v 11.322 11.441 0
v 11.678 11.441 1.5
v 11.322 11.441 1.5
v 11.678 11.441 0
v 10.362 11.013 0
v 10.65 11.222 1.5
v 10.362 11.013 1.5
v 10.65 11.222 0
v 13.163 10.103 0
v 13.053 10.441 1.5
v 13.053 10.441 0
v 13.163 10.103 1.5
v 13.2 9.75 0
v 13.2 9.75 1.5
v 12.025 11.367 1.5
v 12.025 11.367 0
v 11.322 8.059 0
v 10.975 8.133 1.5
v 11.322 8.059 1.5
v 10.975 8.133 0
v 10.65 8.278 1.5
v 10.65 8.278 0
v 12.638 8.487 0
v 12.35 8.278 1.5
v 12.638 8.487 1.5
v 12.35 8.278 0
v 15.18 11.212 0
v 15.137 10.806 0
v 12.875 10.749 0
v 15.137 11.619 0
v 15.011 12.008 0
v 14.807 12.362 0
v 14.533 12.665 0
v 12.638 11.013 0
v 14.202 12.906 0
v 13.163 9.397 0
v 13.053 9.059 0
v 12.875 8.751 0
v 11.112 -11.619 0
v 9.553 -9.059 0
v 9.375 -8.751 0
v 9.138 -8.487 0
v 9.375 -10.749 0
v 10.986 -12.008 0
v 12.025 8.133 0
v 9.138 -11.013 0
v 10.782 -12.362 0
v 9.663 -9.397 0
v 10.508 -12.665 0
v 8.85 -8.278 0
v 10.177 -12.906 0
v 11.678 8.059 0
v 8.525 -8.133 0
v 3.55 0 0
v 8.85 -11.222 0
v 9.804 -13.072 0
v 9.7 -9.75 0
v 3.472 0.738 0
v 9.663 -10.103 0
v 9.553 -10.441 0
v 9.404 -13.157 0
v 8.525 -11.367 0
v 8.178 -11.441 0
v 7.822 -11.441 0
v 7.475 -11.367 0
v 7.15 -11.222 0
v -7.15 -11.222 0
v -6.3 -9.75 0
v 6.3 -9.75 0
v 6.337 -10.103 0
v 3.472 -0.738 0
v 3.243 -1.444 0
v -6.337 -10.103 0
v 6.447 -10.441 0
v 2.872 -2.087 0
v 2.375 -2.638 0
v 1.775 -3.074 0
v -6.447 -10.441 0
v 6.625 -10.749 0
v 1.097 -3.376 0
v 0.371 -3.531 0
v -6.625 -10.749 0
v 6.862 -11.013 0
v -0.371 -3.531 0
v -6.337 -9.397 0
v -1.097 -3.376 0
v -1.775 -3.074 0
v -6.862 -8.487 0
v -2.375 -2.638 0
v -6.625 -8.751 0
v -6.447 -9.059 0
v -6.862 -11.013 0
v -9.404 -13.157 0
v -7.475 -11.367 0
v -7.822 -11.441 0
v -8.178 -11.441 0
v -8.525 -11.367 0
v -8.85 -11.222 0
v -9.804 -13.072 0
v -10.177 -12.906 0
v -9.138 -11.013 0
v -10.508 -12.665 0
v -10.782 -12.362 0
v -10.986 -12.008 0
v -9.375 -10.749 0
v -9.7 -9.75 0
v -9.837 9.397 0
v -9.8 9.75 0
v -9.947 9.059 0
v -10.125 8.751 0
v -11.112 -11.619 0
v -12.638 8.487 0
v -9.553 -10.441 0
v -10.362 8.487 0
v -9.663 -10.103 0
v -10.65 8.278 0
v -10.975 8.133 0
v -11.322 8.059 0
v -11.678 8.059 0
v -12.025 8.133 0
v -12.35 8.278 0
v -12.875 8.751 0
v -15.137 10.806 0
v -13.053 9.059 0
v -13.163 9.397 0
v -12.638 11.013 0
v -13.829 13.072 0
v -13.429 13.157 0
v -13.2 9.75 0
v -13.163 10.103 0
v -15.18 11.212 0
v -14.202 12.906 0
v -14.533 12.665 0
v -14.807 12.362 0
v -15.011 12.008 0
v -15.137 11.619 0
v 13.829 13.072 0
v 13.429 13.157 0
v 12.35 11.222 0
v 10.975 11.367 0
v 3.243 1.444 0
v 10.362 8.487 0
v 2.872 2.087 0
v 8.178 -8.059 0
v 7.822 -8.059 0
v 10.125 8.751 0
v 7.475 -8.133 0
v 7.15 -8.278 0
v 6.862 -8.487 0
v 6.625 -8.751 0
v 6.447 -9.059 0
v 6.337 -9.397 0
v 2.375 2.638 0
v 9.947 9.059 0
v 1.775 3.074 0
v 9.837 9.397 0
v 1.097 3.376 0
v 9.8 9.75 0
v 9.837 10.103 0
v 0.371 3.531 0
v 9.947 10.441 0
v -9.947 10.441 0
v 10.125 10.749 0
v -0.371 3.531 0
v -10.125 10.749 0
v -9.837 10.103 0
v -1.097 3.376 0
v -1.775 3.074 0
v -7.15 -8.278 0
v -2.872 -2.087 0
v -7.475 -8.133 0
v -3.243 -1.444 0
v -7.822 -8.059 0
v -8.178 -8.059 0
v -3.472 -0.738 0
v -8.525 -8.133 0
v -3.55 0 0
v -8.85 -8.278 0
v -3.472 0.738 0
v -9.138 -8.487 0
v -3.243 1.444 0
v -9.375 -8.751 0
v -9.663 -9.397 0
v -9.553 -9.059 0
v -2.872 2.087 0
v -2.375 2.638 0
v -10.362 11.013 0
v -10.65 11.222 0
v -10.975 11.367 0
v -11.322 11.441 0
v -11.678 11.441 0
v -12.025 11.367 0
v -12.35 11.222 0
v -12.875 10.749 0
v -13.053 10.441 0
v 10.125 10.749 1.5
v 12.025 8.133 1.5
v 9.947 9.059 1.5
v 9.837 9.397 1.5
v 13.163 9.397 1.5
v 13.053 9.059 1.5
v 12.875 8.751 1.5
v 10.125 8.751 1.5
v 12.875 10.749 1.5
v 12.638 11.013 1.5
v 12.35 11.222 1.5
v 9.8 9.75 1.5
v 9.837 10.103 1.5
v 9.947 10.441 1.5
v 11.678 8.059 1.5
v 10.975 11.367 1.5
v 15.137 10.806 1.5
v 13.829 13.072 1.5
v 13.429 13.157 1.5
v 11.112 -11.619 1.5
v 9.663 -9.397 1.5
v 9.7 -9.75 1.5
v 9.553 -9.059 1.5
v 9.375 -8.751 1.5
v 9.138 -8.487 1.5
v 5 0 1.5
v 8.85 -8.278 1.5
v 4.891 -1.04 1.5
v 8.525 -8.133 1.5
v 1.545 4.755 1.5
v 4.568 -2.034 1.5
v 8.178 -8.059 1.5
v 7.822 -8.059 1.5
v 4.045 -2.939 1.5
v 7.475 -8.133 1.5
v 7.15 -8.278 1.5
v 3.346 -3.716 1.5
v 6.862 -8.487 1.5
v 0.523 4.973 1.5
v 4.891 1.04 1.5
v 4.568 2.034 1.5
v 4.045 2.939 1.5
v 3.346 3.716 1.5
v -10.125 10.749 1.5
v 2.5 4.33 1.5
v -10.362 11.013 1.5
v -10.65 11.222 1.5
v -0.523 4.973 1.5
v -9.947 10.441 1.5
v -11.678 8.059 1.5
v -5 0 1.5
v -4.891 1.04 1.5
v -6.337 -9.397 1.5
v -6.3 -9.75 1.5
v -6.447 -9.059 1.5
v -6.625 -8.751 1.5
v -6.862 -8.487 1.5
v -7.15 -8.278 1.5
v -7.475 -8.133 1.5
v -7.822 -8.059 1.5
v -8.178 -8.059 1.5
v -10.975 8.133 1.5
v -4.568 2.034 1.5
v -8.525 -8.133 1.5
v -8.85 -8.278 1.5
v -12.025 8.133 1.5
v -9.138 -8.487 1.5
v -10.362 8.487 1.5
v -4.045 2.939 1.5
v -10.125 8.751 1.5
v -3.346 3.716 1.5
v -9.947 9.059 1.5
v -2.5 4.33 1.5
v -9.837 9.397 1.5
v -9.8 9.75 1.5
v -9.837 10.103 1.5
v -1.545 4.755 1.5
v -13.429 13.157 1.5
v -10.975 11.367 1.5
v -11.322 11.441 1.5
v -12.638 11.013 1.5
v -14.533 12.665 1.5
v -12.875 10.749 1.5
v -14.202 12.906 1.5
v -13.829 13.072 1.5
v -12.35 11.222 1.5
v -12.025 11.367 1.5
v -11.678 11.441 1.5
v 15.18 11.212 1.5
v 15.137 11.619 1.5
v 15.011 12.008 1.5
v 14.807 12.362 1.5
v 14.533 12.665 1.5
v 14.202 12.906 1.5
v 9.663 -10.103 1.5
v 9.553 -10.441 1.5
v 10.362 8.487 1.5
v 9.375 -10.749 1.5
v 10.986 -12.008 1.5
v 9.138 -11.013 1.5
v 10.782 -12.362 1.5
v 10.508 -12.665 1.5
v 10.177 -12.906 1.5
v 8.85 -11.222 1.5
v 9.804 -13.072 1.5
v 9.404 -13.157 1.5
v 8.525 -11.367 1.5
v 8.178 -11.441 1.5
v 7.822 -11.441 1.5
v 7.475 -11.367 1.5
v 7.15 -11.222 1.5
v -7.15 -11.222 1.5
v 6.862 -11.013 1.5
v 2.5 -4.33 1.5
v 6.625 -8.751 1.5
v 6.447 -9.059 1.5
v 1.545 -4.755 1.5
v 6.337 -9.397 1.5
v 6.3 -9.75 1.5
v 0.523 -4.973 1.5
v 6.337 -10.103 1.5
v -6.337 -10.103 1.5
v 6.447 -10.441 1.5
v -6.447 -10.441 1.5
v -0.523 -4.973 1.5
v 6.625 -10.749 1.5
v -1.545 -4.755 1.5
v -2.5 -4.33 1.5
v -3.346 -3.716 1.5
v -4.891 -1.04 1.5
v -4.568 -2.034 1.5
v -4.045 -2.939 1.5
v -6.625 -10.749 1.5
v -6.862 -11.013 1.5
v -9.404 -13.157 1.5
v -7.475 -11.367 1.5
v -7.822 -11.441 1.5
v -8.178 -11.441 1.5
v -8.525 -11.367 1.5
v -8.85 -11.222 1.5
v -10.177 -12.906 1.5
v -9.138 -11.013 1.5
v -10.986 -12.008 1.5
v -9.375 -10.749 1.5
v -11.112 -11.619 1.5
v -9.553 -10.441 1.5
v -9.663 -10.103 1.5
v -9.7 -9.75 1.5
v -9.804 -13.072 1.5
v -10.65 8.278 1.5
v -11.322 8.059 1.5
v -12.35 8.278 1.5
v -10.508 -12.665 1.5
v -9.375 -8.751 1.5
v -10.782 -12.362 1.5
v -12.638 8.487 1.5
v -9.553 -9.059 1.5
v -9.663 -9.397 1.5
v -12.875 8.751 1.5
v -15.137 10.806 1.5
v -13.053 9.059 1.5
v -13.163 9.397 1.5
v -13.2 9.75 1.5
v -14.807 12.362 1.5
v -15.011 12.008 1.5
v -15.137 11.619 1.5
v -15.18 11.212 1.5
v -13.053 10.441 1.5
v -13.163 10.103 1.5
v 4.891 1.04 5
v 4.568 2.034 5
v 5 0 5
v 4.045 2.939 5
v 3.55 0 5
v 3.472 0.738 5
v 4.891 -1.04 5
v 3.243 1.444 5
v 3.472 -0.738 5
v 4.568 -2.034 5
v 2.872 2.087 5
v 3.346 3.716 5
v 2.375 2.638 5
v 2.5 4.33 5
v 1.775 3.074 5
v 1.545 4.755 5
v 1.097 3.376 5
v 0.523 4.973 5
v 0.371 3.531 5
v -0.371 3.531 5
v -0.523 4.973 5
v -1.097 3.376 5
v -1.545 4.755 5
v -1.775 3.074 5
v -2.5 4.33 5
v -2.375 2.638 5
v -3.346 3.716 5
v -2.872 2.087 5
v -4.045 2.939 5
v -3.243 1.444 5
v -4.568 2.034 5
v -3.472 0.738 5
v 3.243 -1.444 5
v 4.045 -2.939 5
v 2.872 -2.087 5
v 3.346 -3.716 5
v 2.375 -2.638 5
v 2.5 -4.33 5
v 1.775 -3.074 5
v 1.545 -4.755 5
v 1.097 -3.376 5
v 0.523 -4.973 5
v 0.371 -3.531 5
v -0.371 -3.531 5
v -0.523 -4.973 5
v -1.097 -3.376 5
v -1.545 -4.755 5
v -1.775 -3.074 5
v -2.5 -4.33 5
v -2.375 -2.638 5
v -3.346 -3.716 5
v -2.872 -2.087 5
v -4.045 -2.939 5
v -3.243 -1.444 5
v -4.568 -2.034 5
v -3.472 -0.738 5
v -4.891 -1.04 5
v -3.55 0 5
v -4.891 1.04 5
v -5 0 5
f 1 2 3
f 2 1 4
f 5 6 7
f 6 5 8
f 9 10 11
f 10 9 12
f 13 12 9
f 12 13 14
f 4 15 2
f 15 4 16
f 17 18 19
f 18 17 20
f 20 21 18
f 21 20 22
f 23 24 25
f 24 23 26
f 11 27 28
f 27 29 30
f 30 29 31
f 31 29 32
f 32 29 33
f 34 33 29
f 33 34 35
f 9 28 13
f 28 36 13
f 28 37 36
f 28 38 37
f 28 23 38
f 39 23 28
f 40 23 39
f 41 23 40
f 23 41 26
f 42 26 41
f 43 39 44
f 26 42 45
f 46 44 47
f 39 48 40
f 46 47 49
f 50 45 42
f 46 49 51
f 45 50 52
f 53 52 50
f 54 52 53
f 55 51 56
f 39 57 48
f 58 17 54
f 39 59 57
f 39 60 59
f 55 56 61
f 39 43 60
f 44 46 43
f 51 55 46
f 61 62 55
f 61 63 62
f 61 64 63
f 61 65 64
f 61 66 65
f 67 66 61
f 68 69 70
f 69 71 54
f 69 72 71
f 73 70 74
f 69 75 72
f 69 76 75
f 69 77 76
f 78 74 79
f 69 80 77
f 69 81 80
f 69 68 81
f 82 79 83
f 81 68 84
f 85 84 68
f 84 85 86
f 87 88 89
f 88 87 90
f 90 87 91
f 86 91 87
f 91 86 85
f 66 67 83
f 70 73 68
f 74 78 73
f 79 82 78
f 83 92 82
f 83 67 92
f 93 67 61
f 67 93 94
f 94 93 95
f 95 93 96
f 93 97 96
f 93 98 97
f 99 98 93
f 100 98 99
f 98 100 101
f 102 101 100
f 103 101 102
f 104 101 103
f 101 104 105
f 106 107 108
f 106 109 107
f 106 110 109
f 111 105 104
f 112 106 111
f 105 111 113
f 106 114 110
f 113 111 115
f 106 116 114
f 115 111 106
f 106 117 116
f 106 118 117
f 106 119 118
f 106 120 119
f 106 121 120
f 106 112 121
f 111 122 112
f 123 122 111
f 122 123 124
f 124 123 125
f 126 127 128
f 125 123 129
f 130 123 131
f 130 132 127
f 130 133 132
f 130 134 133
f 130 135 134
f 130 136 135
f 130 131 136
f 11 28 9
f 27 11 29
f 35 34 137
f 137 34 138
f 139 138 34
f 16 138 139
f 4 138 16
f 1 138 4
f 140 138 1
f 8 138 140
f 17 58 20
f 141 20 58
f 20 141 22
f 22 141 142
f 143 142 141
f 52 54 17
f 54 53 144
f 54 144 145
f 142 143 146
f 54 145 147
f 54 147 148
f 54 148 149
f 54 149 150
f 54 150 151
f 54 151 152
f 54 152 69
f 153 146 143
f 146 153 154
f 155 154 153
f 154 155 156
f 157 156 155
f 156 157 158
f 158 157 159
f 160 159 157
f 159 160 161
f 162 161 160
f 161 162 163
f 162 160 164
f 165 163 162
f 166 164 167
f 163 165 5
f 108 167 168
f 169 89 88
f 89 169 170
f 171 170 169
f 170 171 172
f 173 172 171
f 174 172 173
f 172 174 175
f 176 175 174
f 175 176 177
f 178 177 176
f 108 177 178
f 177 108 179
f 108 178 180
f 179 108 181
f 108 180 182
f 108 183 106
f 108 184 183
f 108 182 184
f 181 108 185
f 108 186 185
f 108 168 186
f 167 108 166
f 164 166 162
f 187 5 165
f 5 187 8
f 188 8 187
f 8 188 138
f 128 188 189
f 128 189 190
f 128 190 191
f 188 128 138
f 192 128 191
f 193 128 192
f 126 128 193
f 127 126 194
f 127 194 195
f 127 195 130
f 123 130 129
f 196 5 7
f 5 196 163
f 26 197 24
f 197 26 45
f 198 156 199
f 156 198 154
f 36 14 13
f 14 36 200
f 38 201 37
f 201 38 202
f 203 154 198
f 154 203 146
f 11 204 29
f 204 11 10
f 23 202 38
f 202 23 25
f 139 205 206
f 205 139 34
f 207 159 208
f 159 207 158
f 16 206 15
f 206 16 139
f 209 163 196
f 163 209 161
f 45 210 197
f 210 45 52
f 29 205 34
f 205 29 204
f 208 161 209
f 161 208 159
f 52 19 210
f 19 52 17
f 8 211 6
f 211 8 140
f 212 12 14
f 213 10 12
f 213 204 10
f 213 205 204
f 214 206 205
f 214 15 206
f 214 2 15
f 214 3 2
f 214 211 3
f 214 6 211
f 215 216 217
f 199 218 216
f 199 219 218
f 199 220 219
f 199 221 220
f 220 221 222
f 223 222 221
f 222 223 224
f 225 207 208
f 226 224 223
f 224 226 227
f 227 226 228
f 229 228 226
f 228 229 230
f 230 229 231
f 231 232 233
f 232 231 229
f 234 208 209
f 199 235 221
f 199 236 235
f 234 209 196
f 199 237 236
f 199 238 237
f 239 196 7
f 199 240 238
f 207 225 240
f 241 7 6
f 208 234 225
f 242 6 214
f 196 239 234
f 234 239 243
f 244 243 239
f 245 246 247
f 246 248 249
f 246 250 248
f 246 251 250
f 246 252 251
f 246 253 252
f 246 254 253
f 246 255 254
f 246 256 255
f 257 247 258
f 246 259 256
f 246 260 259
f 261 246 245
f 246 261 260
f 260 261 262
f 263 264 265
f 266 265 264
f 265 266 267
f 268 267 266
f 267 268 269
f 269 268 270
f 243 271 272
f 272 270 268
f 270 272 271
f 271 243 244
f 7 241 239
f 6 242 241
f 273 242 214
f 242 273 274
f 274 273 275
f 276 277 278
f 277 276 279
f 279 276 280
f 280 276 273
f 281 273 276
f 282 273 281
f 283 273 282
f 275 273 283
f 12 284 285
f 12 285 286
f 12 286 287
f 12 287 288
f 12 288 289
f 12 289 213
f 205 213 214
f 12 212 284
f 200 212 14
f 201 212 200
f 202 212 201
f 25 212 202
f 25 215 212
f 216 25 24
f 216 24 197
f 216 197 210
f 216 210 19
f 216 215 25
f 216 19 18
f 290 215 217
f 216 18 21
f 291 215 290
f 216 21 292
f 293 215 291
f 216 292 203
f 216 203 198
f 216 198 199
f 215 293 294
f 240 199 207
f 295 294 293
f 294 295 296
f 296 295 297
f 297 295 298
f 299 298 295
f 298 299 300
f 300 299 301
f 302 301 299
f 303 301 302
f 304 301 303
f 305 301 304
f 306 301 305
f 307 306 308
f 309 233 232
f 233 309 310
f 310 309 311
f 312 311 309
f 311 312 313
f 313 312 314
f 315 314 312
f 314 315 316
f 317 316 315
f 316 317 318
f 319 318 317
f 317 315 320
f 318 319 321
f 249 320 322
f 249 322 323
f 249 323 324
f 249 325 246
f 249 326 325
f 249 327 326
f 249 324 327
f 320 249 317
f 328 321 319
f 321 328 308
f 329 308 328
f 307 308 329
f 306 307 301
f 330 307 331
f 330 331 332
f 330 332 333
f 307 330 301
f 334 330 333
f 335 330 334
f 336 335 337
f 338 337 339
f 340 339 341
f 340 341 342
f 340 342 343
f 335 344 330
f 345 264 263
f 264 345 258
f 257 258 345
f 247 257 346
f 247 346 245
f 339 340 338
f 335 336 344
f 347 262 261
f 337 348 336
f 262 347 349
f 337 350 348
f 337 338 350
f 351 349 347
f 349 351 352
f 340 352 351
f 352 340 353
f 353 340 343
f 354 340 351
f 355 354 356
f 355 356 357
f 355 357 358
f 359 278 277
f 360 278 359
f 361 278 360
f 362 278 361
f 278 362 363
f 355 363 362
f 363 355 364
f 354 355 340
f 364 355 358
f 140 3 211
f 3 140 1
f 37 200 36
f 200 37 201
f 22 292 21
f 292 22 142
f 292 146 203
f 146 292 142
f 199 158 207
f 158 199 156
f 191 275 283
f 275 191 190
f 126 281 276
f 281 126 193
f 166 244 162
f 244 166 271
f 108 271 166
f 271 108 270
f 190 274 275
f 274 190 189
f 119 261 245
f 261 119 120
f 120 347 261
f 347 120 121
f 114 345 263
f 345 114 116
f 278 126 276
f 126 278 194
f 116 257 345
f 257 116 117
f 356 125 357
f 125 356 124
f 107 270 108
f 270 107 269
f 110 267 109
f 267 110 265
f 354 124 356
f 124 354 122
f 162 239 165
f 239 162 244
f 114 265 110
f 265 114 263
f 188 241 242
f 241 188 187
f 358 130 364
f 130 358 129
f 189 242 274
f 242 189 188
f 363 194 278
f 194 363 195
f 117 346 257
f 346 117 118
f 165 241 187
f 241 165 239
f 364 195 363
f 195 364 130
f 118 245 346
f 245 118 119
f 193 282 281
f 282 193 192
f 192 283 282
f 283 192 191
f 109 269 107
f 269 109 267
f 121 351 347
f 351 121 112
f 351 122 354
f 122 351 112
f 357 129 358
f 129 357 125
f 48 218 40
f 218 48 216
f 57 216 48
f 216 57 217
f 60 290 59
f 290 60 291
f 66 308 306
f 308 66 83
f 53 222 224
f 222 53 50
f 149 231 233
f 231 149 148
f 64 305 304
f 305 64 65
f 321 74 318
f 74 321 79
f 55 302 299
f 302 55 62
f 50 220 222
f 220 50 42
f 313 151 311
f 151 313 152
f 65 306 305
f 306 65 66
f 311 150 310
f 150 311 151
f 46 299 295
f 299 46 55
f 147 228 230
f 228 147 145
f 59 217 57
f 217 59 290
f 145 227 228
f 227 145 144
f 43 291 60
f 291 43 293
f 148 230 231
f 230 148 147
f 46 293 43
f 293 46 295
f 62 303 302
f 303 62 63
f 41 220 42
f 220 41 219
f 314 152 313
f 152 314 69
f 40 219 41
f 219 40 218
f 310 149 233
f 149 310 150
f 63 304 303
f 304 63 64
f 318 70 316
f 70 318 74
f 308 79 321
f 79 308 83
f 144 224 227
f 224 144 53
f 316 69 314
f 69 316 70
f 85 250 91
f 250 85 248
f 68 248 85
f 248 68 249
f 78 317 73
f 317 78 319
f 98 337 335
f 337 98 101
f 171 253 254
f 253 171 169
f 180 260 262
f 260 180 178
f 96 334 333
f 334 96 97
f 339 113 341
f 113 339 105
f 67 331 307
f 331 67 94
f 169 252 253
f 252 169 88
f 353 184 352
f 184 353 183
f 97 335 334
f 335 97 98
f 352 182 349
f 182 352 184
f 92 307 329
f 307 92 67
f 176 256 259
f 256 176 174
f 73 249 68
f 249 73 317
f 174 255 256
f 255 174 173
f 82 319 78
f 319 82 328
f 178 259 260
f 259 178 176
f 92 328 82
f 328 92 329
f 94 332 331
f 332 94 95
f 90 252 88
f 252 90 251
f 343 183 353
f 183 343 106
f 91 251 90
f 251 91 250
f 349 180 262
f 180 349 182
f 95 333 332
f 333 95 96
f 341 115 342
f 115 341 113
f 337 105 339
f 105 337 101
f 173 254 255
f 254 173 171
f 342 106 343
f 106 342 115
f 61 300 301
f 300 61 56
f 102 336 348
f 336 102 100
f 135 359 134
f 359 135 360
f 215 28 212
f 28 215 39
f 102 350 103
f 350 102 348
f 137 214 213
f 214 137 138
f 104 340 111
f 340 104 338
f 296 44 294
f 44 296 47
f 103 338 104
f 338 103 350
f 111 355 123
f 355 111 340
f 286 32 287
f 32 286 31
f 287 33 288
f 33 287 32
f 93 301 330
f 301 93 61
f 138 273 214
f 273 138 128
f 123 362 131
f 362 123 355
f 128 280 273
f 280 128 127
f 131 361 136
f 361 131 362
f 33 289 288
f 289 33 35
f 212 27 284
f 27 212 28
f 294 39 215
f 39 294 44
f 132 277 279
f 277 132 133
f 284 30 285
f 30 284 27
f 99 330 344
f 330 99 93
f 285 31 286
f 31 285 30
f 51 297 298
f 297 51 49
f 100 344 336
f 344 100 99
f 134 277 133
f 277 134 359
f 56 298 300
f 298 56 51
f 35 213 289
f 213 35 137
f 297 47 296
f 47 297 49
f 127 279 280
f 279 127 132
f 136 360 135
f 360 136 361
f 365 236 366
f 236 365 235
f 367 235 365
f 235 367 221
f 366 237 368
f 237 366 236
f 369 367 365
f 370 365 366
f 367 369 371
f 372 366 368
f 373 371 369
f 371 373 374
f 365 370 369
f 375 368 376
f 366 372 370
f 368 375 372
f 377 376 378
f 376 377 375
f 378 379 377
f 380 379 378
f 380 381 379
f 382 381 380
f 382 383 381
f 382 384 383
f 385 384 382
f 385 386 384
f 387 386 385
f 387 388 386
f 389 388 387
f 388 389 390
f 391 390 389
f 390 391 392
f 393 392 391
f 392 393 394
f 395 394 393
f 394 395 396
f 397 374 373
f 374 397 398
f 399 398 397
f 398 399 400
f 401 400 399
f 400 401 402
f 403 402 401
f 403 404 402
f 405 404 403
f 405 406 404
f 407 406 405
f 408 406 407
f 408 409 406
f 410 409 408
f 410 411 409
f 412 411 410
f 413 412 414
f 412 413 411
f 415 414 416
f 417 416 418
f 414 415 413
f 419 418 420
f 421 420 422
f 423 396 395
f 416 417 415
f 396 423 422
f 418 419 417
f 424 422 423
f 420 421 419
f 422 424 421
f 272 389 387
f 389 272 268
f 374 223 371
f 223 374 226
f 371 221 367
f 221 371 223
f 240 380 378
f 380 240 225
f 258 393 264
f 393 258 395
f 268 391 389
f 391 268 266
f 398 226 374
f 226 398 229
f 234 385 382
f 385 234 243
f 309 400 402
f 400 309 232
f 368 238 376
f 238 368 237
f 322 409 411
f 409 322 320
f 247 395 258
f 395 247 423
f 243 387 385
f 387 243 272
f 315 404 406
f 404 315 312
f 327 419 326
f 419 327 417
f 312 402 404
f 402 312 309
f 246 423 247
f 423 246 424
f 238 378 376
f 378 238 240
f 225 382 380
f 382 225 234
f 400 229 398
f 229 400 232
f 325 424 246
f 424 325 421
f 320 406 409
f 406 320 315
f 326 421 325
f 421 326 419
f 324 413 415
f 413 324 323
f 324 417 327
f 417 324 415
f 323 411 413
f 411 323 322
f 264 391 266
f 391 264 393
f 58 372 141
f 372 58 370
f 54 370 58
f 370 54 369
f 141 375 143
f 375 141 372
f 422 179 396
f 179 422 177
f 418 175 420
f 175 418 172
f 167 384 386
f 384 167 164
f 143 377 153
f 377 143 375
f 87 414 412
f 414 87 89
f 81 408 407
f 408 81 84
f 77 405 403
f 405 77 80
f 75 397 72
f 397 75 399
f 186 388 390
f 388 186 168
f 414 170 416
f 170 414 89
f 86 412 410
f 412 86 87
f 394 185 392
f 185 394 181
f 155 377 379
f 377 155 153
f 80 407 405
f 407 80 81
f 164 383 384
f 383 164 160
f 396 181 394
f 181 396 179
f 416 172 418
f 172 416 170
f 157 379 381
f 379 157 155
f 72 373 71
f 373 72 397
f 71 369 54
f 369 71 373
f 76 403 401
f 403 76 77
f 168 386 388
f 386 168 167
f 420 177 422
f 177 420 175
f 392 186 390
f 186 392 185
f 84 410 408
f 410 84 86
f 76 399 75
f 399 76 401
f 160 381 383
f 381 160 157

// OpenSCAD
// file: dronePlates.scad
/**
 * dronePlates.scad
 * Plate library
 *
 * GNU GPL V3
 * @author: Victor Potenciano
 */

m3Rad = 3.4/2;
cornerR = 4;

/**
 *
 */
module helperDisk(diameter) {
	cylinder(r = diameter/2, h = 0.6, $fn=20);
}

/**
 *
 */
module roundedRect(size, radius) {
	x = size[0];
	y = size[1];
	z = size[2];

	linear_extrude(height=z)
	hull() {
	// place 4 circles in the corners, with the given radius
	translate([(-x/2)+(radius/2), (-y/2)+(radius/2), 0]){ circle(r=radius); }
	translate([(x/2)-(radius/2), (-y/2)+(radius/2), 0]){ circle(r=radius); }
	translate([(-x/2)+(radius/2), (y/2)-(radius/2), 0]){ circle(r=radius); }
	translate([(x/2)-(radius/2), (y/2)-(radius/2), 0]){ circle(r=radius); }
	}
}

/**
 * rounded rectangle triangle with corner at origin
 */
module roundedTriangle(size, radius) {
	x = size[0];
	y = size[1];
	z = size[2];

	linear_extrude(height=z)
	hull() {
	translate([radius, radius, 0]){ circle(r=radius); }
	translate([x-radius, radius, 0]){ circle(r=radius); }
	translate([radius, y-radius, 0]){ circle(r=radius); }
	}
}

/**
 *
 */
module roundRectPlate(w, l, plateThick=3) {
	difference(){
		roundedRect([l+m3Rad*1.75,w+m3Rad*1.75,plateThick], cornerR);
		translate([l/2, w/2, -0.5]) { cylinder(h = plateThick+1, r = m3Rad, $fn=30); }
		translate([-l/2, w/2, -0.5]) { cylinder(h = plateThick+1, r = m3Rad, $fn=30); }
		translate([l/2, -w/2, -0.5]) { cylinder(h = plateThick+1, r = m3Rad, $fn=30); }
		translate([-l/2, -w/2, -0.5]) { cylinder(h = plateThick+1, r = m3Rad, $fn=30); }
	}
}

/**
 *
 */
module crossSquarePlate(l, thick=3) {
	inDist = cornerR*2+4;
	trianL = sqrt((l*l)/2)-inDist;
	centerR = 4;

	difference(){
		roundRectPlate(l, l, thick);
		translate([0, centerR, -0.5]) { 
			rotate([0,0,45]){ roundedTriangle([trianL,trianL,thick+1], cornerR-2); }
		}
		translate([0, -centerR, -0.5]) { 
			rotate([0,0,225]){ roundedTriangle([trianL,trianL,thick+1], cornerR-2); }
		}
		translate([-centerR, 0, -0.5]) { 
			rotate([0,0,135]){ roundedTriangle([trianL,trianL,thick+1], cornerR-2); }
		}
		translate([centerR, 0, -0.5]) { 
			rotate([0,0,-45]){ roundedTriangle([trianL,trianL,thick+1], cornerR-2); }
		}
	}
}

/**
 *
 */
module hShapePlate(w, l, thick=4) {
	inDist = cornerR*2+1;

	difference(){
		roundRectPlate(w, l, thick);
		translate([0, w/4, -0.5]) { roundedRect([l-inDist,w/2-inDist,thick+1], cornerR-2); }
		translate([0, -w/4, -0.5]) { roundedRect([l-inDist,w/2-inDist,thick+1], cornerR-2); }
	}
}

/**
 *
 */
module motorCircleMount(inDia, outDia, thick=3, extraH=false, d1=19, d2=16, holeR=m3Rad ) {
	difference(){
		cylinder(h = thick, r = outDia/2, $fn=30);
		motorCircleMountHoles(inDia, outDia, thick, extraH, d1=d1, d2=d2, holeR=holeR);
	}
}

/**
 *
 */
module motorCircleMountHoles(inDia, outDia, thick=3, extraH=false, d1=19, d2=16, d3=25, holeR=m3Rad) {
	translate([0, 0, -0.5]) { cylinder(h = thick+1, r = inDia/2, $fn=30); }

	for(i=[0:3]) {
		rotate([0,0,90*i]){
		translate([d1/2, 0, -0.5]) cylinder(h = thick+1, r = holeR, $fn=20);
		translate([d2/2, 0, -0.5]) cylinder(h = thick+1, r = holeR, $fn=20);
		translate([d2/2, -holeR, -0.5]) cube(size = [(d1-d2)/2,holeR*2,thick+1]);
		}
	}
	
	if(extraH==true){	
		for(i=[-1,1]) translate([i*d3/2, 0, -0.5]) { cylinder(h = thick+1, r = holeR, $fn=30); }
	}
}

/**
 *
 */
module motorRectMount(w, l, inDia, thick=3) {
	d1=19;
	d2=16;

	difference(){
		roundRectPlate(w, l, thick);
		translate([0, 0, -0.5]) { cylinder(h = thick+1, r = inDia/2, $fn=30); }
		translate([0, d1/2, -0.5]) { cylinder(h = thick+1, r = m3Rad, $fn=30); }
		translate([0, -d1/2, -0.5]) { cylinder(h = thick+1, r = m3Rad, $fn=30); }
		translate([d2/2, 0, -0.5]) { cylinder(h = thick+1, r = m3Rad, $fn=30); }
		translate([-d2/2, 0, -0.5]) { cylinder(h = thick+1, r = m3Rad, $fn=30); }
	}
}

/**
 *
 */
module tube(inDia, outDia, height) {
	difference(){
		cylinder(h = height, r = outDia/2, $fn=50);
		translate([0, 0, -0.5]) { cylinder(h = height+1, r = inDia/2, $fn=30); }
	}
}

/**
 *
 */
module squareTube(inDia, outDia, height) {
	translate([0,0,height/2]){
	difference(){
		cube(size = [outDia,outDia,height], center = true);
		cube(size = [inDia,inDia,height+1], center = true);
	}
	}
}

/**
 *
 */
module djiFlamewheelHoles(height) {
	a = 23;
	b = 16;
	c = 19.5;
	
	translate([a/2, c/2, 0]) { cylinder(h = height, r = m3Rad, $fn=30); }
	translate([-a/2, c/2, 0]) { cylinder(h = height, r = m3Rad, $fn=30); }
	translate([b/2, -c/2, 0]) { cylinder(h = height, r = m3Rad, $fn=30); }
	translate([-b/2, -c/2, 0]) { cylinder(h = height, r = m3Rad, $fn=30); }
}

/**
 *
 */
module djiFlamewheelHolesBotton(height) {
	a1 = 21;
	c = 19.5;
	
	translate([a1/2, c/2, 0]) { cylinder(h = height, r = m3Rad, $fn=30); }
	translate([-a1/2, c/2, 0]) { cylinder(h = height, r = m3Rad, $fn=30); }
}

/**
 *
 */
module propeller(size){
union(){
difference(){
	cylinder(h = 3, r = size/2, center=true, $fn=30);
	cylinder(h = 3.1, r = size/2-2, center=true, $fn=30); 
}
for( i = [-1,1] ){
rotate([0,0,45*i]){ cube(size = [size,4,1], center = true); }
}
}
}

/**
 *
 */
module slot(length, height, rad){
for(i=[-1,1]) translate([i*length/2,0,0]) cylinder(h = height, r = rad, $fn=30);
translate([0,0,height/2]) cube(size = [length,rad*2,height], center = true);
}

 

////////////////////////
// Examples:
////////////////////////

motorCircleMount(8, 25, 3.5);

//roundedRect([50,50,3], 4);

//hShapePlate(79, 25);

//rotate([0,0,45]){roundedTriangle([40,40,3], 4);}

//crossSquarePlate(45, 4);

/*
union(){
motorRectMount(21, 18, 8, 4);
translate([9, 10.5, 0]) {tube(m3Rad*2, 6.5, 6);}
}
*/

/*
difference(){
union(){
hShapePlate(50, 30, 3.5);
translate([-4,-25,0]){cube(size = [8,50,3.5]);}
rotate([0, 0, 45]) {motorCircleMount(8, 35, 3.5);}
}
cylinder(h = 10, r = 4, $fn=100, center=true);
}
*/

//rotate([90,0,0]){ tube(5,10,20); }
//translate([20,0,0]){ squareTube(5, 10, 20); }
// main file
/**
 * sma antenna extension mount inside f450 arms hub hole
 */

use <dronePlates.scad>;

m3Rad = 3.4/2;
plateThick = 1.5;

difference(){
union(){
hull(){
scale([1.15,1.15,1]) djiFlamewheelHoles(plateThick);
}

cylinder(r=10/2, h=5, $fn=30);

}//union

djiFlamewheelHoles(plateThick);
cylinder(r=7.1/2, h=10, center=true, $fn=30);
}
